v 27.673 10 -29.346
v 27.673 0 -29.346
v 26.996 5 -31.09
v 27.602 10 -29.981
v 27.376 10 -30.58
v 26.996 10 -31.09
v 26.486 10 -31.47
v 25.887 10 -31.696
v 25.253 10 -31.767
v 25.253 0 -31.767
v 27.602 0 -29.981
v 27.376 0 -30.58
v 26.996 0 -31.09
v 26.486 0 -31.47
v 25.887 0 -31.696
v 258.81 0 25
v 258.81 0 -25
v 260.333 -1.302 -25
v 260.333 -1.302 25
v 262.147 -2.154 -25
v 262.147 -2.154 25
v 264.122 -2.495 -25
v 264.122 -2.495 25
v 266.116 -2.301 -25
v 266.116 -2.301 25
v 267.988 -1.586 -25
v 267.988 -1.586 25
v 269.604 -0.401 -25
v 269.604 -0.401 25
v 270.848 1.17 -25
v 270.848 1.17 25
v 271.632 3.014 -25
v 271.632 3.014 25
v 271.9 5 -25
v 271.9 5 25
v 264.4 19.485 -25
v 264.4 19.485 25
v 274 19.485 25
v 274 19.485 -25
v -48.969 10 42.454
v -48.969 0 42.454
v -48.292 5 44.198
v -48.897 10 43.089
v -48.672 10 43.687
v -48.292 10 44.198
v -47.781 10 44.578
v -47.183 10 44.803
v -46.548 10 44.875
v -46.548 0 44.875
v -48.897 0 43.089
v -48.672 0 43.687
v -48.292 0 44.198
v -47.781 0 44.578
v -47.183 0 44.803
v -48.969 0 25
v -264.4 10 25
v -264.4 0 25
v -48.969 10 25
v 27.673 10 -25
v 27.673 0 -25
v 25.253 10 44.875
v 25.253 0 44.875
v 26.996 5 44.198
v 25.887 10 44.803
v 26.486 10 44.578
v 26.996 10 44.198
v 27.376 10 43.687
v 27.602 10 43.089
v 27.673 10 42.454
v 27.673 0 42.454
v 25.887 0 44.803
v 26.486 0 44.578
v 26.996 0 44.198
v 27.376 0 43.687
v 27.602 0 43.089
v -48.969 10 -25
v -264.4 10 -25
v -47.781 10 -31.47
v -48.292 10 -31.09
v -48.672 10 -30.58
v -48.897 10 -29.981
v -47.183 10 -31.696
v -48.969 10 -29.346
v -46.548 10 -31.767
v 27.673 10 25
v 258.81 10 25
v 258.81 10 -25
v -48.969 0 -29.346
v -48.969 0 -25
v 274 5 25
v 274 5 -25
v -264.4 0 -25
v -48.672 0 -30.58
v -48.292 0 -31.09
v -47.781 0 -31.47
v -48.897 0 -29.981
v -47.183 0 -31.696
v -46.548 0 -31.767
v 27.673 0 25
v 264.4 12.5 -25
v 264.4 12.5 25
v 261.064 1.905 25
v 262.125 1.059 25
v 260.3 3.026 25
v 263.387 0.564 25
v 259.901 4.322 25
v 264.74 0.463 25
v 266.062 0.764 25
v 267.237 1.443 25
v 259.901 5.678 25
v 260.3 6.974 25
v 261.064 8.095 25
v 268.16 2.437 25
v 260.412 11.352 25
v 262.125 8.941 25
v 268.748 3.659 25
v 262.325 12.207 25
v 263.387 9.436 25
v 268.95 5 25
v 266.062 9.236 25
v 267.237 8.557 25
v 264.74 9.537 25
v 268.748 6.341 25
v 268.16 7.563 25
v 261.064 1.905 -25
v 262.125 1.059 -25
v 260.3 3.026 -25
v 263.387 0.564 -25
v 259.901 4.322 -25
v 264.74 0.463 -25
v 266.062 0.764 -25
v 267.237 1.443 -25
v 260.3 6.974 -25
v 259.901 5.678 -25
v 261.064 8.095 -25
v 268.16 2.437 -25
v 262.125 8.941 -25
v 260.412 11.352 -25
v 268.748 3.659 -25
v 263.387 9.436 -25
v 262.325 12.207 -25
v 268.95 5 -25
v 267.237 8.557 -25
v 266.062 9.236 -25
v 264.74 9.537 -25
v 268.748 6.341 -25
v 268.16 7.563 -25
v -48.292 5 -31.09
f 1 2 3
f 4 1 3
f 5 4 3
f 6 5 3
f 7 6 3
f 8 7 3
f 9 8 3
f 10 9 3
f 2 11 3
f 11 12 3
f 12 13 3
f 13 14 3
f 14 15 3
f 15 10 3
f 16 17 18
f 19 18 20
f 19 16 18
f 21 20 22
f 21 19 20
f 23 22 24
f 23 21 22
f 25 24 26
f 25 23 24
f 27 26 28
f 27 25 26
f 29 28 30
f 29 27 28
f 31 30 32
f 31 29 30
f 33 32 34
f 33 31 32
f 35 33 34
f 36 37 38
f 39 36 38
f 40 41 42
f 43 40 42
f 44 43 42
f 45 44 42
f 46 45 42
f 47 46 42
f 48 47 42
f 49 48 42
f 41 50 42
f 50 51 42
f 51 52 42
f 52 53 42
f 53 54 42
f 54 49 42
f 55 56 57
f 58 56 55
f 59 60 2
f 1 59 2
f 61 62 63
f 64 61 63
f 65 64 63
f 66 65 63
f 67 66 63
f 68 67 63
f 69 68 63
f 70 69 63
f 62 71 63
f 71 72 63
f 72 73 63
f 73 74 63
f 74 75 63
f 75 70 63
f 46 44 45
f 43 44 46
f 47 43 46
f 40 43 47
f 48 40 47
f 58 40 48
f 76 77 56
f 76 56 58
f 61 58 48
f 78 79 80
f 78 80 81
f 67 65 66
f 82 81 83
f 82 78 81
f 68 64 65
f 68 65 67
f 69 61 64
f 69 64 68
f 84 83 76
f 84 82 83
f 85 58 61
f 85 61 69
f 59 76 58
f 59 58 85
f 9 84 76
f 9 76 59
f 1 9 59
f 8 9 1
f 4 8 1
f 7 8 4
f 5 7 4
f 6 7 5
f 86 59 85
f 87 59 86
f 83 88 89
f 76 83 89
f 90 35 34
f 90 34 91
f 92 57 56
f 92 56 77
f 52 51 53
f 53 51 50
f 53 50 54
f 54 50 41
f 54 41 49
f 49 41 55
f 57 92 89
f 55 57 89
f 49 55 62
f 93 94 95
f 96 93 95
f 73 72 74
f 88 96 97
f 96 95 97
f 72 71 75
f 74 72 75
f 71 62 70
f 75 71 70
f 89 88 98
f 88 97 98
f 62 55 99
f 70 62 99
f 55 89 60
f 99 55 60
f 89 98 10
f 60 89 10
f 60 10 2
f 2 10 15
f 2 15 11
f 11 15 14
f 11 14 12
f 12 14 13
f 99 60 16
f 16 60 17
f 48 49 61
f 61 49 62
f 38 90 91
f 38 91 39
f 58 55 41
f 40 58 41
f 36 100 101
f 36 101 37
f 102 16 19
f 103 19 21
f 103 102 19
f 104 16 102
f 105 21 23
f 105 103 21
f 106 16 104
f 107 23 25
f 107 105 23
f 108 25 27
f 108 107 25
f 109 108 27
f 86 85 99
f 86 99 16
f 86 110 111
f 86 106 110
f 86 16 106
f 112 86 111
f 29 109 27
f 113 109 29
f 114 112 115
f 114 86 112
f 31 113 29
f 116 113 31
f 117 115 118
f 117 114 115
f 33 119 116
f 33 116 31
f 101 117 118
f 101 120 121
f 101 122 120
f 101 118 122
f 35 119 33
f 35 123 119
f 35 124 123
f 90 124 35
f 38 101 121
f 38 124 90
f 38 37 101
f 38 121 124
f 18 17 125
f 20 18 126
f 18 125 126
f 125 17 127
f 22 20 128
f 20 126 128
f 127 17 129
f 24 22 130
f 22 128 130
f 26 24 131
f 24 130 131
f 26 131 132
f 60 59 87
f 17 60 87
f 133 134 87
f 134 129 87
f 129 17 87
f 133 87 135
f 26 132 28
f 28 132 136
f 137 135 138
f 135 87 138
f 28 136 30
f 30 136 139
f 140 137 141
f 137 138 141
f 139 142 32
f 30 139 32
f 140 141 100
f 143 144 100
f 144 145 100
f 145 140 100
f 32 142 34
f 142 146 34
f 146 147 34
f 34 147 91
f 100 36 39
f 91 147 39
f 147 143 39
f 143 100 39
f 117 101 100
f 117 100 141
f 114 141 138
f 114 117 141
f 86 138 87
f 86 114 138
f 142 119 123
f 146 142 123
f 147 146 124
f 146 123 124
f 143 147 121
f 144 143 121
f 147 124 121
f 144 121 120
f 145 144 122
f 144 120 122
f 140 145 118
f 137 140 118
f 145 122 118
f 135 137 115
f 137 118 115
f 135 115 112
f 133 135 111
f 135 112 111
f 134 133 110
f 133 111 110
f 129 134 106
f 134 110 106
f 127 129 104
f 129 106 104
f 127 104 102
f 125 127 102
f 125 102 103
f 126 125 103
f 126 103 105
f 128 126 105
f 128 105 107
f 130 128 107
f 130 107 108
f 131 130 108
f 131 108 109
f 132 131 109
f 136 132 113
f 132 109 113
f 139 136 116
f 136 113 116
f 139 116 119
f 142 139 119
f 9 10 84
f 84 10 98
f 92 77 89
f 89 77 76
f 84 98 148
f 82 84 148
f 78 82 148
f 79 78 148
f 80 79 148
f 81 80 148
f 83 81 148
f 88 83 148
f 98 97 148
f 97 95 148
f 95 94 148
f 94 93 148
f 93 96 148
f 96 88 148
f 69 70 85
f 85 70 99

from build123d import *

# Parameters (mm, degrees)
SKETCH1_W      = 528.8
SKETCH1_H      = 50
EXTRUDE2_DEPTH = 10
SKETCH2_R      = 7.5
EXTRUDE3_DEPTH = 50
SKETCH3_W      = 9.599831793
SKETCH3_H      = 14.484799928
EXTRUDE4_DEPTH = 50
SKETCH5_R      = 4.55017582
EXTRUDE5_DEPTH = 50
EXTRUDE6_DEPTH = 10


with BuildPart() as part:
    # Sketch1 → Extrude2 (new body)
    with BuildSketch(Plane(origin=(0, 0, 0), x_dir=(1, 0, 0), z_dir=(0, 1, 0))):
        Rectangle(SKETCH1_W, SKETCH1_H)
    extrude(amount=EXTRUDE2_DEPTH)

    # Sketch2 → Extrude3 (add)
    with BuildSketch(Plane.XY.offset(25)):
        with Locations((264.4, 5)):
            Circle(SKETCH2_R)
    extrude(amount=-EXTRUDE3_DEPTH)

    # Sketch3 → Extrude4 (add)
    with BuildSketch(Plane.XY.offset(25)):
        with Locations((269.199915896, 12.242399964)):
            Rectangle(SKETCH3_W, SKETCH3_H)
    extrude(amount=-EXTRUDE4_DEPTH)

    # Sketch5 → Extrude5 (cut)
    with BuildSketch(Plane.XY.offset(25)):
        with Locations((264.4, 5)):
            Circle(SKETCH5_R)
    extrude(amount=-EXTRUDE5_DEPTH, mode=Mode.SUBTRACT)

    # Sketch6 → Extrude6 (add)
    with BuildSketch(Plane(origin=(0, 0, 0), x_dir=(1, 0, 0), z_dir=(0, 1, 0))):
        with BuildLine():
            Line((-48.968651803, 29.346426348), (-48.968651803, -42.454090949))
            add(Edge.make_bspline(
                [(-48.968651803, -42.454090949), (-48.968651803, -44.874729009), (-46.548013742, -44.874729009)],
                knots=[5.620479698, 5.620479698, 5.620479698, 6.945890916, 6.945890916, 6.945890916], degree=2, weights=[1, 0.788330488, 1]))
            Line((-46.548013742, -44.874729009), (25.252503554, -44.874729009))
            add(Edge.make_bspline(
                [(25.252503554, -44.874729009), (27.673141615, -44.874729009), (27.673141615, -42.454090949)],
                knots=[5.620479698, 5.620479698, 5.620479698, 6.945890916, 6.945890916, 6.945890916], degree=2, weights=[1, 0.788330488, 1]))
            Line((27.673141615, -42.454090949), (27.673141615, 29.346426348))
            add(Edge.make_bspline(
                [(27.673141615, 29.346426348), (27.673141615, 31.767064408), (25.252503554, 31.767064408)],
                knots=[5.620479698, 5.620479698, 5.620479698, 6.945890916, 6.945890916, 6.945890916], degree=2, weights=[1, 0.788330488, 1]))
            Line((25.252503554, 31.767064408), (-46.548013742, 31.767064408))
            add(Edge.make_bspline(
                [(-46.548013742, 31.767064408), (-48.968651803, 31.767064408), (-48.968651803, 29.346426348)],
                knots=[5.620479698, 5.620479698, 5.620479698, 6.945890916, 6.945890916, 6.945890916], degree=2, weights=[1, 0.788330488, 1]))
        make_face()
    extrude(amount=EXTRUDE6_DEPTH)


solid = part.part
